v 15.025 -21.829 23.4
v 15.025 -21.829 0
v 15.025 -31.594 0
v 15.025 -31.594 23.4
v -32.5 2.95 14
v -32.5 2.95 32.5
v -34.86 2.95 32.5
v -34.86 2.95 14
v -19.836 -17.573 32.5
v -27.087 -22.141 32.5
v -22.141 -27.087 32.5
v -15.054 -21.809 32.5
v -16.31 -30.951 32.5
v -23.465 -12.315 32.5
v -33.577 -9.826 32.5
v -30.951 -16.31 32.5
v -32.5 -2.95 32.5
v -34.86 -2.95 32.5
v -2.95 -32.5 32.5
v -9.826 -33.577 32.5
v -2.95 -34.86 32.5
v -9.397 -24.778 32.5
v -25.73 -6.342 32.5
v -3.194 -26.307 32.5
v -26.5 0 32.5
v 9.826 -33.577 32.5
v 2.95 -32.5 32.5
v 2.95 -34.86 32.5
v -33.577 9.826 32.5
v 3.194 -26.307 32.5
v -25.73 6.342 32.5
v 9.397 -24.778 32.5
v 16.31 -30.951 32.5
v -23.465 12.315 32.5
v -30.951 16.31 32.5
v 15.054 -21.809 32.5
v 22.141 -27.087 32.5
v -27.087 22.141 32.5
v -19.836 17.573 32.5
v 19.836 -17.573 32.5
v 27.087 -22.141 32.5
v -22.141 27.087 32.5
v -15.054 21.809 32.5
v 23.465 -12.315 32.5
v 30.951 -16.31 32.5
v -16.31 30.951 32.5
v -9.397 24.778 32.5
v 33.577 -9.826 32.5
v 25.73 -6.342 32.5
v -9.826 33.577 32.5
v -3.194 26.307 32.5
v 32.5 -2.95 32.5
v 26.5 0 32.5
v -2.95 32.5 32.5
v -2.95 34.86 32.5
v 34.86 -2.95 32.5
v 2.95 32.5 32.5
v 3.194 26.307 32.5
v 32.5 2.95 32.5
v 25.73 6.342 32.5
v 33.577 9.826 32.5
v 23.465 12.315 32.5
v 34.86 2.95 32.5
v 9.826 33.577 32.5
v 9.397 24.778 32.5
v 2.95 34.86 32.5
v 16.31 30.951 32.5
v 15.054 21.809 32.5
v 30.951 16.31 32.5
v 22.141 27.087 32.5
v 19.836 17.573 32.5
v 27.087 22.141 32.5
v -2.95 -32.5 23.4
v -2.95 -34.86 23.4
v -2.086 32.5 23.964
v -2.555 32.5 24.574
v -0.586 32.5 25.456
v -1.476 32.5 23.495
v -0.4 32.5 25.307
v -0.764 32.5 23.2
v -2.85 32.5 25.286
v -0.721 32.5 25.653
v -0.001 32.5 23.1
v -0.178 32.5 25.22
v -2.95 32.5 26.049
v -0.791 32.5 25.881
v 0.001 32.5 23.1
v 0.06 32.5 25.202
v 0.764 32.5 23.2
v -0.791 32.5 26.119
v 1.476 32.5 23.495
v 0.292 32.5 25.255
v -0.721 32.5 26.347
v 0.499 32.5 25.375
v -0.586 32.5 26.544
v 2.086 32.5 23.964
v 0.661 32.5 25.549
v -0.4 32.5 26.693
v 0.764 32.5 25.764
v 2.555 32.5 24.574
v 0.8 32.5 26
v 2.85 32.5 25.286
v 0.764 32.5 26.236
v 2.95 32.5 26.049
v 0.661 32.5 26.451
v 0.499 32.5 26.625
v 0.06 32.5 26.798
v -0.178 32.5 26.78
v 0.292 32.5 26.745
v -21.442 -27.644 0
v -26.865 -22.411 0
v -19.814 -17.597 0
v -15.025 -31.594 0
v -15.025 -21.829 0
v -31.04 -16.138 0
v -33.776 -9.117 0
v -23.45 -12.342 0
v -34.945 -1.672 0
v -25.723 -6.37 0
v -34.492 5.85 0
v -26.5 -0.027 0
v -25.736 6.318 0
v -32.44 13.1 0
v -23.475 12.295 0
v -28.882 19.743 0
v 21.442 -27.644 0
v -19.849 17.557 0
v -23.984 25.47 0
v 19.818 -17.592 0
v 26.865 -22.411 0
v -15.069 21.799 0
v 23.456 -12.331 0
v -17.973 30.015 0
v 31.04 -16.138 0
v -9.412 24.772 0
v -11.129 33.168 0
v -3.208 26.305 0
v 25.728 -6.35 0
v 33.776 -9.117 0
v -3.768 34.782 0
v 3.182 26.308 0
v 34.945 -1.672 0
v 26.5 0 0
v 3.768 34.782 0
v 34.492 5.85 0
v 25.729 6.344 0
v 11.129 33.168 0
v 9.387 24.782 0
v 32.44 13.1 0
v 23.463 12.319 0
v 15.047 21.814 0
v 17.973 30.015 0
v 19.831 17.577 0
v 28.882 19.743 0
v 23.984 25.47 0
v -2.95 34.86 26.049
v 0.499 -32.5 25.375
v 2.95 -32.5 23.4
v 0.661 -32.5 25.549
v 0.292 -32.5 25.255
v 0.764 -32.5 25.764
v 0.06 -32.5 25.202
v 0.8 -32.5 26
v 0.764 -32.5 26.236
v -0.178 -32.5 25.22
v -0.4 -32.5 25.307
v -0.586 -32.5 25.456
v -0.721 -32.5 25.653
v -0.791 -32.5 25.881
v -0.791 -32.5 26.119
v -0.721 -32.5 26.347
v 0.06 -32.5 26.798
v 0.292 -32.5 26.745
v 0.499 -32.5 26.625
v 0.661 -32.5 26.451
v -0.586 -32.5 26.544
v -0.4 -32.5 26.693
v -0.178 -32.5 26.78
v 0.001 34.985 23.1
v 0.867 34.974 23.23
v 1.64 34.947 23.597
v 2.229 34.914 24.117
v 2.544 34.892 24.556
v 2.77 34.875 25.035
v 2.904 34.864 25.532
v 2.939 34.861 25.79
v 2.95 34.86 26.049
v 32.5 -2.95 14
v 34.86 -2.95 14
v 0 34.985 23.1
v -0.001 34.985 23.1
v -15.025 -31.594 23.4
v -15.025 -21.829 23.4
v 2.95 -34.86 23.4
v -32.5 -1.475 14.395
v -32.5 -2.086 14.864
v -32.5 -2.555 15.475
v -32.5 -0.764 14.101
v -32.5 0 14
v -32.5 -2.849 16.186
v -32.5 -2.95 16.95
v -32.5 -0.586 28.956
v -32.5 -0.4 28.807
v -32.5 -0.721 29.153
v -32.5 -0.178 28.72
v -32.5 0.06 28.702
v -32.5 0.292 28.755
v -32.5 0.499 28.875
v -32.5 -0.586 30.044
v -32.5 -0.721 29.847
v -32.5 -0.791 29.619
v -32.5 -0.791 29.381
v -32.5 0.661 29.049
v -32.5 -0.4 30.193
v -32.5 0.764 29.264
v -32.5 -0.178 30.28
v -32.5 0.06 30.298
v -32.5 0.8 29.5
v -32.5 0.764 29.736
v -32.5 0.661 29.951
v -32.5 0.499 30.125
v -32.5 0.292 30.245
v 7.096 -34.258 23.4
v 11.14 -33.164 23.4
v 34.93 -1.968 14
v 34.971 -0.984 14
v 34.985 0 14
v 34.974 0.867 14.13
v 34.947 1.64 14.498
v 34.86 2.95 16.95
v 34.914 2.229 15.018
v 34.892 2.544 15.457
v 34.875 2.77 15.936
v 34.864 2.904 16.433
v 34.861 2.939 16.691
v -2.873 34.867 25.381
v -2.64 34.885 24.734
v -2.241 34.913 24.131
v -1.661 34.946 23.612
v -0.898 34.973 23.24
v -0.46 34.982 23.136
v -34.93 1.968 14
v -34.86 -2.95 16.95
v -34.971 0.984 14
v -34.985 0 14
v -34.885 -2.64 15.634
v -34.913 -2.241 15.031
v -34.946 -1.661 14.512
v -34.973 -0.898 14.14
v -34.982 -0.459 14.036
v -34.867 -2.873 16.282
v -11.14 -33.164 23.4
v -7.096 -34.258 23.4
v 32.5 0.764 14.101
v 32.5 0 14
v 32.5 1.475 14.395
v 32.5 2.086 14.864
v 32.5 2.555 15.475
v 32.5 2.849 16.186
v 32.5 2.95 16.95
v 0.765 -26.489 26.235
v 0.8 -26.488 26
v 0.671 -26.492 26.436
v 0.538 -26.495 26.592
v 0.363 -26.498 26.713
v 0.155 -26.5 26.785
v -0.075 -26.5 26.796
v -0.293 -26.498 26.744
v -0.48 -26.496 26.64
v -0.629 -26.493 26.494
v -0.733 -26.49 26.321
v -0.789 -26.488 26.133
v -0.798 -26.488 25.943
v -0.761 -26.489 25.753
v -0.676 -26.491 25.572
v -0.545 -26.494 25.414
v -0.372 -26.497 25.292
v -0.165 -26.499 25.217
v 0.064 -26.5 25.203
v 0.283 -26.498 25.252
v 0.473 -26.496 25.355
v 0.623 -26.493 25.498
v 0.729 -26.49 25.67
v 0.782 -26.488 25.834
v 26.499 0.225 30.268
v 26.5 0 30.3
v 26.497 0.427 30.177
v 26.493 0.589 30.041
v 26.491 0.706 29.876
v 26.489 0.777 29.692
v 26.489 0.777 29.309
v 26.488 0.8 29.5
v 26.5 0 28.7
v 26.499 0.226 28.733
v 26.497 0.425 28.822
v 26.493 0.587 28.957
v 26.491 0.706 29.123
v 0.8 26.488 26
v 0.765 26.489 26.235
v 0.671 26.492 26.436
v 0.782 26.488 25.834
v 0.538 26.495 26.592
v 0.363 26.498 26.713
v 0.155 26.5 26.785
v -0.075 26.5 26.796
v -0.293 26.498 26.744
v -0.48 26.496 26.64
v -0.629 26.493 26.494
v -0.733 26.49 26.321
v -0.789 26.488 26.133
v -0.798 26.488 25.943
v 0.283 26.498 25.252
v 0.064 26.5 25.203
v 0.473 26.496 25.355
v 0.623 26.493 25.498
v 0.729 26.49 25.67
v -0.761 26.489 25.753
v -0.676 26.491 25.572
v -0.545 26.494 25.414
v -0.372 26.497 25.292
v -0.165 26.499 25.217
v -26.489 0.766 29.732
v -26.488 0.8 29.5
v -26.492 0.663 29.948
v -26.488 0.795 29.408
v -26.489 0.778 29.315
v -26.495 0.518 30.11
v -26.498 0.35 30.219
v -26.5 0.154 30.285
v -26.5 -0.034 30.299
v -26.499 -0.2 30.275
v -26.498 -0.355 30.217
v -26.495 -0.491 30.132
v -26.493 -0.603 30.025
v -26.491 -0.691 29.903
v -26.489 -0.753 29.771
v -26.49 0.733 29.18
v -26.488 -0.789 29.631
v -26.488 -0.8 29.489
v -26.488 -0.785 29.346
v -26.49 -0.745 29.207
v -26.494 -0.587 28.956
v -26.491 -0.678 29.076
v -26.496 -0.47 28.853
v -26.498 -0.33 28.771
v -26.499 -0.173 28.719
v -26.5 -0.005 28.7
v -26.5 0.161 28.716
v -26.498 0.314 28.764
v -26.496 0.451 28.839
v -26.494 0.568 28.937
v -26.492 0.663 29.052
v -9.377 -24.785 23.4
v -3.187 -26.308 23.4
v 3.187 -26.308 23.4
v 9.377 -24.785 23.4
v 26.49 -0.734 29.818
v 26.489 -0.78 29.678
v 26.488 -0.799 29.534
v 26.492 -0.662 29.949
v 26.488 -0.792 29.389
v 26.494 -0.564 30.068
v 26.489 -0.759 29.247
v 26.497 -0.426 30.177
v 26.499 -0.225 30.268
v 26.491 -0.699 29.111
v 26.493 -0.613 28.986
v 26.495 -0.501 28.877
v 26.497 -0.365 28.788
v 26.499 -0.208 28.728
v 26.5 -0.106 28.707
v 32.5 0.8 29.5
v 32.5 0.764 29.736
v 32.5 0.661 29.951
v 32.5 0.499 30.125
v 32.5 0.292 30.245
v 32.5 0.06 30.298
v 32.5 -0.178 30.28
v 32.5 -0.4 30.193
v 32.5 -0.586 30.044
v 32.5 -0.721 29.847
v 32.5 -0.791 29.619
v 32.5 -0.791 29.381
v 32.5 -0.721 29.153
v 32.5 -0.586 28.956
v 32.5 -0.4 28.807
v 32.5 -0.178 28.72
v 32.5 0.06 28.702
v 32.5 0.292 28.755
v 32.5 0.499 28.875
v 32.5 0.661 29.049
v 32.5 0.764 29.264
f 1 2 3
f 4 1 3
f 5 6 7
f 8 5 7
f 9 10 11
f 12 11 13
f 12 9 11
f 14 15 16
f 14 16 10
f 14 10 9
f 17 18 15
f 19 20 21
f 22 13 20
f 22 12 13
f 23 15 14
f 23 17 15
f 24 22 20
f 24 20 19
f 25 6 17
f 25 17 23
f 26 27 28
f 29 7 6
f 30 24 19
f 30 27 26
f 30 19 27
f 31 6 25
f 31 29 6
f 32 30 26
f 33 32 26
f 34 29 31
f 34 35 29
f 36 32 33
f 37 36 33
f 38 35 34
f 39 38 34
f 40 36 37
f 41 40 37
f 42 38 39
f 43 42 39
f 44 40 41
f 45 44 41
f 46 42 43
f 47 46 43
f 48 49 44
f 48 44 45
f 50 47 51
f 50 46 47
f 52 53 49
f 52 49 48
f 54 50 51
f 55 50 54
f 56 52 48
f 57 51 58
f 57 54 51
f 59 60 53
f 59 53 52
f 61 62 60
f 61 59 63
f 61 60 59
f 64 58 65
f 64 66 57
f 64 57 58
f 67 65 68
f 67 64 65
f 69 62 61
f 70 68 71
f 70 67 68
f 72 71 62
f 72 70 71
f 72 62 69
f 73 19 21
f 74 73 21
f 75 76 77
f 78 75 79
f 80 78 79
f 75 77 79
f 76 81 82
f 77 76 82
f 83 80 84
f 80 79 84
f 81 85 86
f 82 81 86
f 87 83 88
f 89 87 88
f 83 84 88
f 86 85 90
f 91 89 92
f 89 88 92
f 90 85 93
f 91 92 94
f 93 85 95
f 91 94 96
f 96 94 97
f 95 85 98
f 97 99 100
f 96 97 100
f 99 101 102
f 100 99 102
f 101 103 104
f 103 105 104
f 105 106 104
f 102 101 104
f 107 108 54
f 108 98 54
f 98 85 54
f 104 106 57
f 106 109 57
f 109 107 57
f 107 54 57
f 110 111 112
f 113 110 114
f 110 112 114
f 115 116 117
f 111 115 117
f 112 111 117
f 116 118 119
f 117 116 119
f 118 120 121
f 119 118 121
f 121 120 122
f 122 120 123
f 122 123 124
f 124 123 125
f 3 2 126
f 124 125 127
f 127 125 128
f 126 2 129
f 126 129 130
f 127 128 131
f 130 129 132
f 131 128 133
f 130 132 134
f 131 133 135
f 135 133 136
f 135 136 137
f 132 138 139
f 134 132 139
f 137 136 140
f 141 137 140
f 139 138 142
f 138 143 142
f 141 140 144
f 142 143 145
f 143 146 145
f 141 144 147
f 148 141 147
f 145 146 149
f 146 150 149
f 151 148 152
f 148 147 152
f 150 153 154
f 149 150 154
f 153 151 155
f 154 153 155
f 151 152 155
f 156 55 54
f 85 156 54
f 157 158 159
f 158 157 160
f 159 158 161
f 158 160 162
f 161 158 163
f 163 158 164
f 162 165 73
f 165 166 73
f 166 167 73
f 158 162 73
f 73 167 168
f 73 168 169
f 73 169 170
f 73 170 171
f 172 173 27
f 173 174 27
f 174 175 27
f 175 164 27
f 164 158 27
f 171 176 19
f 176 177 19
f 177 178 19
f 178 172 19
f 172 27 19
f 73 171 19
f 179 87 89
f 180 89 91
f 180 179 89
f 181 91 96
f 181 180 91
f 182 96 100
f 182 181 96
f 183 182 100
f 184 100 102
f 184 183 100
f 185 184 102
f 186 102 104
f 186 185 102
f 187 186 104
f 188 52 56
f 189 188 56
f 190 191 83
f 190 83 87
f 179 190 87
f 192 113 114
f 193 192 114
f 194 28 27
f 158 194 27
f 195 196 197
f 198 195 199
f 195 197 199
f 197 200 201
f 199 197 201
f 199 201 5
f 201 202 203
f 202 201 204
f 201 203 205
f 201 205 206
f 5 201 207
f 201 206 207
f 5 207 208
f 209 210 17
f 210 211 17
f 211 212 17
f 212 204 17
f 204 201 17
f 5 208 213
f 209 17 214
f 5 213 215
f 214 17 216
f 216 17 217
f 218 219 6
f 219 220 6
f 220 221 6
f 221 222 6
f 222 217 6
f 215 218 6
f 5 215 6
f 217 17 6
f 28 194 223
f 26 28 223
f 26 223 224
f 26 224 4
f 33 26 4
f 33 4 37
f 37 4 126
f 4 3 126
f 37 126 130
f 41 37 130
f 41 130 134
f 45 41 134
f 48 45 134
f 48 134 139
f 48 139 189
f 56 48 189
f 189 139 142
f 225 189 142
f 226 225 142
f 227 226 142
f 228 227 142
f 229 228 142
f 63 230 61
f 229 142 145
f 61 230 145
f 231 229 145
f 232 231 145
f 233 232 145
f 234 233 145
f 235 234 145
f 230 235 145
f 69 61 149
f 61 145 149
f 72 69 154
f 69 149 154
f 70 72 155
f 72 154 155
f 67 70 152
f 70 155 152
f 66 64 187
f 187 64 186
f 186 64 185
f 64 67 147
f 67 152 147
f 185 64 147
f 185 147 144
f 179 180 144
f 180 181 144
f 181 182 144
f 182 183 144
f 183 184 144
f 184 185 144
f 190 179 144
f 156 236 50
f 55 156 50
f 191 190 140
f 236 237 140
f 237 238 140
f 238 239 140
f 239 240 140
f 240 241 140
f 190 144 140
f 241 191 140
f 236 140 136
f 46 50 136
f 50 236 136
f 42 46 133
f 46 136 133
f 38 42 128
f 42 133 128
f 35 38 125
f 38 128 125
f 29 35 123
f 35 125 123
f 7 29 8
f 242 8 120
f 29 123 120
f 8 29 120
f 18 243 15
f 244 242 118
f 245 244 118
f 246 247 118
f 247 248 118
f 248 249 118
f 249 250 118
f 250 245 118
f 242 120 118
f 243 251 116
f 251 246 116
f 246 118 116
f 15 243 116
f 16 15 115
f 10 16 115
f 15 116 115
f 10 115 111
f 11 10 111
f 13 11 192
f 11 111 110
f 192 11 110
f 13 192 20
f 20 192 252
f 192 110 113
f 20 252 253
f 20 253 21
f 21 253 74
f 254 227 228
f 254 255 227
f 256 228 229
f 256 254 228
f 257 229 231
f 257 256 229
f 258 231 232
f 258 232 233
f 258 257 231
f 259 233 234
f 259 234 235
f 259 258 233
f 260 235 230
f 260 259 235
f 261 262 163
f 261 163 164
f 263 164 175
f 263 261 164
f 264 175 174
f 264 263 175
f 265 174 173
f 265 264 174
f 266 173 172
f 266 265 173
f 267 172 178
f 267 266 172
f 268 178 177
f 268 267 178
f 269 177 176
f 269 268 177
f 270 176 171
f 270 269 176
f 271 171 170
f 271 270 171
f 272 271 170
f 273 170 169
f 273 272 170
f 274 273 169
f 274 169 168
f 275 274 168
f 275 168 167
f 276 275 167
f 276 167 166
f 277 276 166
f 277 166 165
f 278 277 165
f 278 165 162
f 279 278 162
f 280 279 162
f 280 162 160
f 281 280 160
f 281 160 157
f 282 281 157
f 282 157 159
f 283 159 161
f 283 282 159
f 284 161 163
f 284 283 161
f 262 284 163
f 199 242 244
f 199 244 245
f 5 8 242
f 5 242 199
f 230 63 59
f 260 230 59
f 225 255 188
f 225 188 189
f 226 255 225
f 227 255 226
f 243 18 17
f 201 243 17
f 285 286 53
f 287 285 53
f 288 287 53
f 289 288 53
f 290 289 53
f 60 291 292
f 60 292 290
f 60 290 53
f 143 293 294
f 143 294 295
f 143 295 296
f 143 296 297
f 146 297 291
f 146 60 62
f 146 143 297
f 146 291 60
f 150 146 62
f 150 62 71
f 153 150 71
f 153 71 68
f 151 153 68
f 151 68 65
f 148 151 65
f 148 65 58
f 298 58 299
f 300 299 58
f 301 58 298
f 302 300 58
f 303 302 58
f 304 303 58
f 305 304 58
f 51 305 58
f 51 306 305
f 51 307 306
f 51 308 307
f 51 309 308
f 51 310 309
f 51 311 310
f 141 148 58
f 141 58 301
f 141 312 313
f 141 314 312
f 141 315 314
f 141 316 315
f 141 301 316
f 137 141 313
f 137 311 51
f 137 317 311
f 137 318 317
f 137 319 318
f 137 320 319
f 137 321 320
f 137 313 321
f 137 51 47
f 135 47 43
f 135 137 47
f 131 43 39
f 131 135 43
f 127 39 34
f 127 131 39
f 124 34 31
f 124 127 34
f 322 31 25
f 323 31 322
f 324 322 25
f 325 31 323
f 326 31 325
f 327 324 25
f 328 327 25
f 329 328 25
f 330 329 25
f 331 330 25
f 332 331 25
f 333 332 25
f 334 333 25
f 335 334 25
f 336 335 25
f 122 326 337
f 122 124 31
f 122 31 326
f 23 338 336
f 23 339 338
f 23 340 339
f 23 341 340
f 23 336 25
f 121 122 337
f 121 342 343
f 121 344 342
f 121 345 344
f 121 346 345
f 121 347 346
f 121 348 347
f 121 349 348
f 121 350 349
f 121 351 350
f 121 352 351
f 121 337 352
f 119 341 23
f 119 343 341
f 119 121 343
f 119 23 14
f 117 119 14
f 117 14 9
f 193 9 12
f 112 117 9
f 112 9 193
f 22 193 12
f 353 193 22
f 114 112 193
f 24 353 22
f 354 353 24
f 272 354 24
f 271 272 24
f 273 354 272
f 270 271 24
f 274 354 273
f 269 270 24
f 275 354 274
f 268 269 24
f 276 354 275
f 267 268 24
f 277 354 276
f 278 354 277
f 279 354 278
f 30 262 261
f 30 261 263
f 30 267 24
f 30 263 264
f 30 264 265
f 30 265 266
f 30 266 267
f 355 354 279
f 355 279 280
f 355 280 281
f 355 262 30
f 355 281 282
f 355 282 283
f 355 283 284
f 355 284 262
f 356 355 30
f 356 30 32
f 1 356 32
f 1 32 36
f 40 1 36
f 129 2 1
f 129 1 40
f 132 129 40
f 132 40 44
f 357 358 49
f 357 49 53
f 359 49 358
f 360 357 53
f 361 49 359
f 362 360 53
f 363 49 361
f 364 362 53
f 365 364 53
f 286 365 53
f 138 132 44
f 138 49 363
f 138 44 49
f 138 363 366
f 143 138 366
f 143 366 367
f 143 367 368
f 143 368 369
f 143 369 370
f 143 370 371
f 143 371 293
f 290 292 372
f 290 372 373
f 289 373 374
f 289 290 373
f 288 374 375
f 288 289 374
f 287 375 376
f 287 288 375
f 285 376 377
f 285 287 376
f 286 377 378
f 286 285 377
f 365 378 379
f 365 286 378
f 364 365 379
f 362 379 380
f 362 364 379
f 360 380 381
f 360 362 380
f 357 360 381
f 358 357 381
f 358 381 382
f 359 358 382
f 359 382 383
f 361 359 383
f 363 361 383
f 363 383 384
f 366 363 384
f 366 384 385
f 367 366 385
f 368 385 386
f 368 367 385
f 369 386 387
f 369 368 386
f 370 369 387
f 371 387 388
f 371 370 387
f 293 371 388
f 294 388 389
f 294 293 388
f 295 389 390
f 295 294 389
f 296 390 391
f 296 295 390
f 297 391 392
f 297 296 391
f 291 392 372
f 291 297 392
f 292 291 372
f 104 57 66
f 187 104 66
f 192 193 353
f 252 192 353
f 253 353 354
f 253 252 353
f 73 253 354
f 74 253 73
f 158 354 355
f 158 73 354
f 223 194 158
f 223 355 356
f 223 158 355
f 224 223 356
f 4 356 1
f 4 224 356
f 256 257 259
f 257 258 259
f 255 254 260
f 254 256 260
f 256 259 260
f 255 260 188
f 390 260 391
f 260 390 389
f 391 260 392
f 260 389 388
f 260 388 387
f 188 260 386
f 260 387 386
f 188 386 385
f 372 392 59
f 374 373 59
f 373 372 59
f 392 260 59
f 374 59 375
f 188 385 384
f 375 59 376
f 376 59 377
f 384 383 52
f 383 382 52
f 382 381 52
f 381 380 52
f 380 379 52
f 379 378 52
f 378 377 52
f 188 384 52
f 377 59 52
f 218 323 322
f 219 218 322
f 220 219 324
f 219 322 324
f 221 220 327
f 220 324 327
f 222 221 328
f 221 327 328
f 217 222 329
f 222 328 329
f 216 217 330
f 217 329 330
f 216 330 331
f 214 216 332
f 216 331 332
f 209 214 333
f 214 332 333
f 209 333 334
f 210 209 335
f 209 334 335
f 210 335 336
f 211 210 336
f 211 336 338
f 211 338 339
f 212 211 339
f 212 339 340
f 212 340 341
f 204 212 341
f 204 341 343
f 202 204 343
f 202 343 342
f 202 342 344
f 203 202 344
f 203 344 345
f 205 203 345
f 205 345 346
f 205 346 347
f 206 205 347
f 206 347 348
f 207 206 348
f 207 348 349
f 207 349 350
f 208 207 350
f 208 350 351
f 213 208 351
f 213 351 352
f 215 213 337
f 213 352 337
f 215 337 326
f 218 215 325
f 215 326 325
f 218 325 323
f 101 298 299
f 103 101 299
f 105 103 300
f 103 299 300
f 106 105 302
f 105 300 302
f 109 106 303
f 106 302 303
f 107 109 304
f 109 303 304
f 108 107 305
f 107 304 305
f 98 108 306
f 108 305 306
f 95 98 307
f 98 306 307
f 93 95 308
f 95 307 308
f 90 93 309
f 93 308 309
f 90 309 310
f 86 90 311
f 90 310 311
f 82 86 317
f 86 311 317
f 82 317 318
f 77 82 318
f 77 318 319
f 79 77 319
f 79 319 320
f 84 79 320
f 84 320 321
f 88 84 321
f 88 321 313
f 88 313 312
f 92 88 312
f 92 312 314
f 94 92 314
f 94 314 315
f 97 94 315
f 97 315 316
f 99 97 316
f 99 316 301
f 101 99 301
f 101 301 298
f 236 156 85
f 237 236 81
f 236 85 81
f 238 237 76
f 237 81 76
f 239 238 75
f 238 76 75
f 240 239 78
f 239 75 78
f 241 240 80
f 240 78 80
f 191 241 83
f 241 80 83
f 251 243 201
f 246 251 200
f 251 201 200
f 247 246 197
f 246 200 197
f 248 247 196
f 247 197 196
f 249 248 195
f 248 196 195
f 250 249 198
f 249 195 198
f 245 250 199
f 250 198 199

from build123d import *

# Parameters (mm, degrees)
F0_R           = 34.985
F0_R_2         = 26.5
F1_DEPTH       = 32.5
F3_DEPTH       = 23.4
F5_DEPTH       = 18.5
F6_R           = 2.95
F7_R           = 0.8
F8_DEPTH       = 34.9860001
F8_DEPTH_BACK  = 34.9860001
F10_DEPTH      = 9.4
F11_R          = 2.949
F12_R          = 0.8
F13_DEPTH      = 34.9860001
F13_DEPTH_BACK = 34.861403497


# Not quite as in the source:
# - a fillet or chamfer is up to 0.001 mm smaller than in the source, because OpenCascade refuses the exact size


with BuildPart() as f1:
    # F0 (on Top) → F1 (new body)
    with BuildSketch(Plane.XY):
        Circle(F0_R)
        Circle(F0_R_2, mode=Mode.SUBTRACT)
    extrude(amount=F1_DEPTH)

    # F2 (on face) → F3 (cut)
    with BuildSketch(Plane(origin=(0, 0, 0), x_dir=(1, 0, 0), z_dir=(0, 0, -1))):
        with BuildLine():
            ThreePointArc((15.025, 31.5942969537), (0, 34.985), (-15.025, 31.5942969537))
            Line((-15.025, 31.5942969537), (-15.025, 21.828865637))
            ThreePointArc((-15.025, 21.828865637), (0, 26.5), (15.025, 21.828865637))
            Line((15.025, 21.828865637), (15.025, 31.5942969537))
        make_face()
    extrude(amount=-F3_DEPTH, mode=Mode.SUBTRACT)

    # F4 (on face) → F5 (cut)
    with BuildSketch(Plane.XY.offset(32.5)):
        with BuildLine():
            ThreePointArc((34.985, 0), (34.9538369699, 1.4763150336), (34.860403397, 2.95))
            Line((34.860403397, 2.95), (32.5, 2.95))
            Line((32.5, 2.95), (32.5, -2.95))
            Line((32.5, -2.95), (34.860403397, -2.95))
            ThreePointArc((34.860403397, -2.95), (34.9538369699, -1.4763150336), (34.985, 0))
        make_face()
        with BuildLine():
            Line((-32.5, 2.95), (-34.860403397, 2.95))
            ThreePointArc((-34.860403397, 2.95), (-34.985, 0), (-34.860403397, -2.95))
            Line((-34.860403397, -2.95), (-32.5, -2.95))
            Line((-32.5, -2.95), (-32.5, 2.95))
        make_face()
    extrude(amount=-F5_DEPTH, mode=Mode.SUBTRACT)

    # F6
    f6_edges = [f1.edges().sort_by_distance(p)[0] for p in [
        (-33.680202, -2.95, 14),
        (33.680202, 2.95, 14),
    ]]
    fillet(f6_edges, radius=F6_R)

    # F7 (on Right) → F8 (cut, two sides)
    with BuildSketch(Plane.YZ) as f8_sk:
        with Locations((0, 29.5)):
            Circle(F7_R)
    extrude(amount=-F8_DEPTH, mode=Mode.SUBTRACT)
    extrude(f8_sk.sketch, amount=F8_DEPTH_BACK, mode=Mode.SUBTRACT)

    # F9 (on face) → F10 (cut)
    with BuildSketch(Plane.XY.offset(32.5)):
        with BuildLine():
            ThreePointArc((2.95, 34.860403397), (0, 34.985), (-2.95, 34.860403397))
            Line((-2.95, 34.860403397), (-2.95, 32.5))
            Line((-2.95, 32.5), (2.95, 32.5))
            Line((2.95, 32.5), (2.95, 34.860403397))
        make_face()
        with BuildLine():
            Line((-2.95, -32.5), (-2.95, -34.860403397))
            ThreePointArc((-2.95, -34.860403397), (0, -34.985), (2.95, -34.860403397))
            Line((2.95, -34.860403397), (2.95, -32.5))
            Line((2.95, -32.5), (-2.95, -32.5))
        make_face()
    extrude(amount=-F10_DEPTH, mode=Mode.SUBTRACT)

    # F11 (radius 2.95 in the source; OpenCascade refuses exactly that, so slightly less here)
    f11_edges = [f1.edges().sort_by_distance(p)[0] for p in [
        (-2.95, 33.680202, 23.1),
        (2.95, 33.680202, 23.1),
    ]]
    fillet(f11_edges, radius=F11_R)

    # F12 (on Front) → F13 (cut, two sides)
    with BuildSketch(Plane.XZ) as f13_sk:
        with Locations((0, 26)):
            Circle(F12_R)
    extrude(amount=-F13_DEPTH, mode=Mode.SUBTRACT)
    extrude(f13_sk.sketch, amount=F13_DEPTH_BACK, mode=Mode.SUBTRACT)


solid = f1.part
